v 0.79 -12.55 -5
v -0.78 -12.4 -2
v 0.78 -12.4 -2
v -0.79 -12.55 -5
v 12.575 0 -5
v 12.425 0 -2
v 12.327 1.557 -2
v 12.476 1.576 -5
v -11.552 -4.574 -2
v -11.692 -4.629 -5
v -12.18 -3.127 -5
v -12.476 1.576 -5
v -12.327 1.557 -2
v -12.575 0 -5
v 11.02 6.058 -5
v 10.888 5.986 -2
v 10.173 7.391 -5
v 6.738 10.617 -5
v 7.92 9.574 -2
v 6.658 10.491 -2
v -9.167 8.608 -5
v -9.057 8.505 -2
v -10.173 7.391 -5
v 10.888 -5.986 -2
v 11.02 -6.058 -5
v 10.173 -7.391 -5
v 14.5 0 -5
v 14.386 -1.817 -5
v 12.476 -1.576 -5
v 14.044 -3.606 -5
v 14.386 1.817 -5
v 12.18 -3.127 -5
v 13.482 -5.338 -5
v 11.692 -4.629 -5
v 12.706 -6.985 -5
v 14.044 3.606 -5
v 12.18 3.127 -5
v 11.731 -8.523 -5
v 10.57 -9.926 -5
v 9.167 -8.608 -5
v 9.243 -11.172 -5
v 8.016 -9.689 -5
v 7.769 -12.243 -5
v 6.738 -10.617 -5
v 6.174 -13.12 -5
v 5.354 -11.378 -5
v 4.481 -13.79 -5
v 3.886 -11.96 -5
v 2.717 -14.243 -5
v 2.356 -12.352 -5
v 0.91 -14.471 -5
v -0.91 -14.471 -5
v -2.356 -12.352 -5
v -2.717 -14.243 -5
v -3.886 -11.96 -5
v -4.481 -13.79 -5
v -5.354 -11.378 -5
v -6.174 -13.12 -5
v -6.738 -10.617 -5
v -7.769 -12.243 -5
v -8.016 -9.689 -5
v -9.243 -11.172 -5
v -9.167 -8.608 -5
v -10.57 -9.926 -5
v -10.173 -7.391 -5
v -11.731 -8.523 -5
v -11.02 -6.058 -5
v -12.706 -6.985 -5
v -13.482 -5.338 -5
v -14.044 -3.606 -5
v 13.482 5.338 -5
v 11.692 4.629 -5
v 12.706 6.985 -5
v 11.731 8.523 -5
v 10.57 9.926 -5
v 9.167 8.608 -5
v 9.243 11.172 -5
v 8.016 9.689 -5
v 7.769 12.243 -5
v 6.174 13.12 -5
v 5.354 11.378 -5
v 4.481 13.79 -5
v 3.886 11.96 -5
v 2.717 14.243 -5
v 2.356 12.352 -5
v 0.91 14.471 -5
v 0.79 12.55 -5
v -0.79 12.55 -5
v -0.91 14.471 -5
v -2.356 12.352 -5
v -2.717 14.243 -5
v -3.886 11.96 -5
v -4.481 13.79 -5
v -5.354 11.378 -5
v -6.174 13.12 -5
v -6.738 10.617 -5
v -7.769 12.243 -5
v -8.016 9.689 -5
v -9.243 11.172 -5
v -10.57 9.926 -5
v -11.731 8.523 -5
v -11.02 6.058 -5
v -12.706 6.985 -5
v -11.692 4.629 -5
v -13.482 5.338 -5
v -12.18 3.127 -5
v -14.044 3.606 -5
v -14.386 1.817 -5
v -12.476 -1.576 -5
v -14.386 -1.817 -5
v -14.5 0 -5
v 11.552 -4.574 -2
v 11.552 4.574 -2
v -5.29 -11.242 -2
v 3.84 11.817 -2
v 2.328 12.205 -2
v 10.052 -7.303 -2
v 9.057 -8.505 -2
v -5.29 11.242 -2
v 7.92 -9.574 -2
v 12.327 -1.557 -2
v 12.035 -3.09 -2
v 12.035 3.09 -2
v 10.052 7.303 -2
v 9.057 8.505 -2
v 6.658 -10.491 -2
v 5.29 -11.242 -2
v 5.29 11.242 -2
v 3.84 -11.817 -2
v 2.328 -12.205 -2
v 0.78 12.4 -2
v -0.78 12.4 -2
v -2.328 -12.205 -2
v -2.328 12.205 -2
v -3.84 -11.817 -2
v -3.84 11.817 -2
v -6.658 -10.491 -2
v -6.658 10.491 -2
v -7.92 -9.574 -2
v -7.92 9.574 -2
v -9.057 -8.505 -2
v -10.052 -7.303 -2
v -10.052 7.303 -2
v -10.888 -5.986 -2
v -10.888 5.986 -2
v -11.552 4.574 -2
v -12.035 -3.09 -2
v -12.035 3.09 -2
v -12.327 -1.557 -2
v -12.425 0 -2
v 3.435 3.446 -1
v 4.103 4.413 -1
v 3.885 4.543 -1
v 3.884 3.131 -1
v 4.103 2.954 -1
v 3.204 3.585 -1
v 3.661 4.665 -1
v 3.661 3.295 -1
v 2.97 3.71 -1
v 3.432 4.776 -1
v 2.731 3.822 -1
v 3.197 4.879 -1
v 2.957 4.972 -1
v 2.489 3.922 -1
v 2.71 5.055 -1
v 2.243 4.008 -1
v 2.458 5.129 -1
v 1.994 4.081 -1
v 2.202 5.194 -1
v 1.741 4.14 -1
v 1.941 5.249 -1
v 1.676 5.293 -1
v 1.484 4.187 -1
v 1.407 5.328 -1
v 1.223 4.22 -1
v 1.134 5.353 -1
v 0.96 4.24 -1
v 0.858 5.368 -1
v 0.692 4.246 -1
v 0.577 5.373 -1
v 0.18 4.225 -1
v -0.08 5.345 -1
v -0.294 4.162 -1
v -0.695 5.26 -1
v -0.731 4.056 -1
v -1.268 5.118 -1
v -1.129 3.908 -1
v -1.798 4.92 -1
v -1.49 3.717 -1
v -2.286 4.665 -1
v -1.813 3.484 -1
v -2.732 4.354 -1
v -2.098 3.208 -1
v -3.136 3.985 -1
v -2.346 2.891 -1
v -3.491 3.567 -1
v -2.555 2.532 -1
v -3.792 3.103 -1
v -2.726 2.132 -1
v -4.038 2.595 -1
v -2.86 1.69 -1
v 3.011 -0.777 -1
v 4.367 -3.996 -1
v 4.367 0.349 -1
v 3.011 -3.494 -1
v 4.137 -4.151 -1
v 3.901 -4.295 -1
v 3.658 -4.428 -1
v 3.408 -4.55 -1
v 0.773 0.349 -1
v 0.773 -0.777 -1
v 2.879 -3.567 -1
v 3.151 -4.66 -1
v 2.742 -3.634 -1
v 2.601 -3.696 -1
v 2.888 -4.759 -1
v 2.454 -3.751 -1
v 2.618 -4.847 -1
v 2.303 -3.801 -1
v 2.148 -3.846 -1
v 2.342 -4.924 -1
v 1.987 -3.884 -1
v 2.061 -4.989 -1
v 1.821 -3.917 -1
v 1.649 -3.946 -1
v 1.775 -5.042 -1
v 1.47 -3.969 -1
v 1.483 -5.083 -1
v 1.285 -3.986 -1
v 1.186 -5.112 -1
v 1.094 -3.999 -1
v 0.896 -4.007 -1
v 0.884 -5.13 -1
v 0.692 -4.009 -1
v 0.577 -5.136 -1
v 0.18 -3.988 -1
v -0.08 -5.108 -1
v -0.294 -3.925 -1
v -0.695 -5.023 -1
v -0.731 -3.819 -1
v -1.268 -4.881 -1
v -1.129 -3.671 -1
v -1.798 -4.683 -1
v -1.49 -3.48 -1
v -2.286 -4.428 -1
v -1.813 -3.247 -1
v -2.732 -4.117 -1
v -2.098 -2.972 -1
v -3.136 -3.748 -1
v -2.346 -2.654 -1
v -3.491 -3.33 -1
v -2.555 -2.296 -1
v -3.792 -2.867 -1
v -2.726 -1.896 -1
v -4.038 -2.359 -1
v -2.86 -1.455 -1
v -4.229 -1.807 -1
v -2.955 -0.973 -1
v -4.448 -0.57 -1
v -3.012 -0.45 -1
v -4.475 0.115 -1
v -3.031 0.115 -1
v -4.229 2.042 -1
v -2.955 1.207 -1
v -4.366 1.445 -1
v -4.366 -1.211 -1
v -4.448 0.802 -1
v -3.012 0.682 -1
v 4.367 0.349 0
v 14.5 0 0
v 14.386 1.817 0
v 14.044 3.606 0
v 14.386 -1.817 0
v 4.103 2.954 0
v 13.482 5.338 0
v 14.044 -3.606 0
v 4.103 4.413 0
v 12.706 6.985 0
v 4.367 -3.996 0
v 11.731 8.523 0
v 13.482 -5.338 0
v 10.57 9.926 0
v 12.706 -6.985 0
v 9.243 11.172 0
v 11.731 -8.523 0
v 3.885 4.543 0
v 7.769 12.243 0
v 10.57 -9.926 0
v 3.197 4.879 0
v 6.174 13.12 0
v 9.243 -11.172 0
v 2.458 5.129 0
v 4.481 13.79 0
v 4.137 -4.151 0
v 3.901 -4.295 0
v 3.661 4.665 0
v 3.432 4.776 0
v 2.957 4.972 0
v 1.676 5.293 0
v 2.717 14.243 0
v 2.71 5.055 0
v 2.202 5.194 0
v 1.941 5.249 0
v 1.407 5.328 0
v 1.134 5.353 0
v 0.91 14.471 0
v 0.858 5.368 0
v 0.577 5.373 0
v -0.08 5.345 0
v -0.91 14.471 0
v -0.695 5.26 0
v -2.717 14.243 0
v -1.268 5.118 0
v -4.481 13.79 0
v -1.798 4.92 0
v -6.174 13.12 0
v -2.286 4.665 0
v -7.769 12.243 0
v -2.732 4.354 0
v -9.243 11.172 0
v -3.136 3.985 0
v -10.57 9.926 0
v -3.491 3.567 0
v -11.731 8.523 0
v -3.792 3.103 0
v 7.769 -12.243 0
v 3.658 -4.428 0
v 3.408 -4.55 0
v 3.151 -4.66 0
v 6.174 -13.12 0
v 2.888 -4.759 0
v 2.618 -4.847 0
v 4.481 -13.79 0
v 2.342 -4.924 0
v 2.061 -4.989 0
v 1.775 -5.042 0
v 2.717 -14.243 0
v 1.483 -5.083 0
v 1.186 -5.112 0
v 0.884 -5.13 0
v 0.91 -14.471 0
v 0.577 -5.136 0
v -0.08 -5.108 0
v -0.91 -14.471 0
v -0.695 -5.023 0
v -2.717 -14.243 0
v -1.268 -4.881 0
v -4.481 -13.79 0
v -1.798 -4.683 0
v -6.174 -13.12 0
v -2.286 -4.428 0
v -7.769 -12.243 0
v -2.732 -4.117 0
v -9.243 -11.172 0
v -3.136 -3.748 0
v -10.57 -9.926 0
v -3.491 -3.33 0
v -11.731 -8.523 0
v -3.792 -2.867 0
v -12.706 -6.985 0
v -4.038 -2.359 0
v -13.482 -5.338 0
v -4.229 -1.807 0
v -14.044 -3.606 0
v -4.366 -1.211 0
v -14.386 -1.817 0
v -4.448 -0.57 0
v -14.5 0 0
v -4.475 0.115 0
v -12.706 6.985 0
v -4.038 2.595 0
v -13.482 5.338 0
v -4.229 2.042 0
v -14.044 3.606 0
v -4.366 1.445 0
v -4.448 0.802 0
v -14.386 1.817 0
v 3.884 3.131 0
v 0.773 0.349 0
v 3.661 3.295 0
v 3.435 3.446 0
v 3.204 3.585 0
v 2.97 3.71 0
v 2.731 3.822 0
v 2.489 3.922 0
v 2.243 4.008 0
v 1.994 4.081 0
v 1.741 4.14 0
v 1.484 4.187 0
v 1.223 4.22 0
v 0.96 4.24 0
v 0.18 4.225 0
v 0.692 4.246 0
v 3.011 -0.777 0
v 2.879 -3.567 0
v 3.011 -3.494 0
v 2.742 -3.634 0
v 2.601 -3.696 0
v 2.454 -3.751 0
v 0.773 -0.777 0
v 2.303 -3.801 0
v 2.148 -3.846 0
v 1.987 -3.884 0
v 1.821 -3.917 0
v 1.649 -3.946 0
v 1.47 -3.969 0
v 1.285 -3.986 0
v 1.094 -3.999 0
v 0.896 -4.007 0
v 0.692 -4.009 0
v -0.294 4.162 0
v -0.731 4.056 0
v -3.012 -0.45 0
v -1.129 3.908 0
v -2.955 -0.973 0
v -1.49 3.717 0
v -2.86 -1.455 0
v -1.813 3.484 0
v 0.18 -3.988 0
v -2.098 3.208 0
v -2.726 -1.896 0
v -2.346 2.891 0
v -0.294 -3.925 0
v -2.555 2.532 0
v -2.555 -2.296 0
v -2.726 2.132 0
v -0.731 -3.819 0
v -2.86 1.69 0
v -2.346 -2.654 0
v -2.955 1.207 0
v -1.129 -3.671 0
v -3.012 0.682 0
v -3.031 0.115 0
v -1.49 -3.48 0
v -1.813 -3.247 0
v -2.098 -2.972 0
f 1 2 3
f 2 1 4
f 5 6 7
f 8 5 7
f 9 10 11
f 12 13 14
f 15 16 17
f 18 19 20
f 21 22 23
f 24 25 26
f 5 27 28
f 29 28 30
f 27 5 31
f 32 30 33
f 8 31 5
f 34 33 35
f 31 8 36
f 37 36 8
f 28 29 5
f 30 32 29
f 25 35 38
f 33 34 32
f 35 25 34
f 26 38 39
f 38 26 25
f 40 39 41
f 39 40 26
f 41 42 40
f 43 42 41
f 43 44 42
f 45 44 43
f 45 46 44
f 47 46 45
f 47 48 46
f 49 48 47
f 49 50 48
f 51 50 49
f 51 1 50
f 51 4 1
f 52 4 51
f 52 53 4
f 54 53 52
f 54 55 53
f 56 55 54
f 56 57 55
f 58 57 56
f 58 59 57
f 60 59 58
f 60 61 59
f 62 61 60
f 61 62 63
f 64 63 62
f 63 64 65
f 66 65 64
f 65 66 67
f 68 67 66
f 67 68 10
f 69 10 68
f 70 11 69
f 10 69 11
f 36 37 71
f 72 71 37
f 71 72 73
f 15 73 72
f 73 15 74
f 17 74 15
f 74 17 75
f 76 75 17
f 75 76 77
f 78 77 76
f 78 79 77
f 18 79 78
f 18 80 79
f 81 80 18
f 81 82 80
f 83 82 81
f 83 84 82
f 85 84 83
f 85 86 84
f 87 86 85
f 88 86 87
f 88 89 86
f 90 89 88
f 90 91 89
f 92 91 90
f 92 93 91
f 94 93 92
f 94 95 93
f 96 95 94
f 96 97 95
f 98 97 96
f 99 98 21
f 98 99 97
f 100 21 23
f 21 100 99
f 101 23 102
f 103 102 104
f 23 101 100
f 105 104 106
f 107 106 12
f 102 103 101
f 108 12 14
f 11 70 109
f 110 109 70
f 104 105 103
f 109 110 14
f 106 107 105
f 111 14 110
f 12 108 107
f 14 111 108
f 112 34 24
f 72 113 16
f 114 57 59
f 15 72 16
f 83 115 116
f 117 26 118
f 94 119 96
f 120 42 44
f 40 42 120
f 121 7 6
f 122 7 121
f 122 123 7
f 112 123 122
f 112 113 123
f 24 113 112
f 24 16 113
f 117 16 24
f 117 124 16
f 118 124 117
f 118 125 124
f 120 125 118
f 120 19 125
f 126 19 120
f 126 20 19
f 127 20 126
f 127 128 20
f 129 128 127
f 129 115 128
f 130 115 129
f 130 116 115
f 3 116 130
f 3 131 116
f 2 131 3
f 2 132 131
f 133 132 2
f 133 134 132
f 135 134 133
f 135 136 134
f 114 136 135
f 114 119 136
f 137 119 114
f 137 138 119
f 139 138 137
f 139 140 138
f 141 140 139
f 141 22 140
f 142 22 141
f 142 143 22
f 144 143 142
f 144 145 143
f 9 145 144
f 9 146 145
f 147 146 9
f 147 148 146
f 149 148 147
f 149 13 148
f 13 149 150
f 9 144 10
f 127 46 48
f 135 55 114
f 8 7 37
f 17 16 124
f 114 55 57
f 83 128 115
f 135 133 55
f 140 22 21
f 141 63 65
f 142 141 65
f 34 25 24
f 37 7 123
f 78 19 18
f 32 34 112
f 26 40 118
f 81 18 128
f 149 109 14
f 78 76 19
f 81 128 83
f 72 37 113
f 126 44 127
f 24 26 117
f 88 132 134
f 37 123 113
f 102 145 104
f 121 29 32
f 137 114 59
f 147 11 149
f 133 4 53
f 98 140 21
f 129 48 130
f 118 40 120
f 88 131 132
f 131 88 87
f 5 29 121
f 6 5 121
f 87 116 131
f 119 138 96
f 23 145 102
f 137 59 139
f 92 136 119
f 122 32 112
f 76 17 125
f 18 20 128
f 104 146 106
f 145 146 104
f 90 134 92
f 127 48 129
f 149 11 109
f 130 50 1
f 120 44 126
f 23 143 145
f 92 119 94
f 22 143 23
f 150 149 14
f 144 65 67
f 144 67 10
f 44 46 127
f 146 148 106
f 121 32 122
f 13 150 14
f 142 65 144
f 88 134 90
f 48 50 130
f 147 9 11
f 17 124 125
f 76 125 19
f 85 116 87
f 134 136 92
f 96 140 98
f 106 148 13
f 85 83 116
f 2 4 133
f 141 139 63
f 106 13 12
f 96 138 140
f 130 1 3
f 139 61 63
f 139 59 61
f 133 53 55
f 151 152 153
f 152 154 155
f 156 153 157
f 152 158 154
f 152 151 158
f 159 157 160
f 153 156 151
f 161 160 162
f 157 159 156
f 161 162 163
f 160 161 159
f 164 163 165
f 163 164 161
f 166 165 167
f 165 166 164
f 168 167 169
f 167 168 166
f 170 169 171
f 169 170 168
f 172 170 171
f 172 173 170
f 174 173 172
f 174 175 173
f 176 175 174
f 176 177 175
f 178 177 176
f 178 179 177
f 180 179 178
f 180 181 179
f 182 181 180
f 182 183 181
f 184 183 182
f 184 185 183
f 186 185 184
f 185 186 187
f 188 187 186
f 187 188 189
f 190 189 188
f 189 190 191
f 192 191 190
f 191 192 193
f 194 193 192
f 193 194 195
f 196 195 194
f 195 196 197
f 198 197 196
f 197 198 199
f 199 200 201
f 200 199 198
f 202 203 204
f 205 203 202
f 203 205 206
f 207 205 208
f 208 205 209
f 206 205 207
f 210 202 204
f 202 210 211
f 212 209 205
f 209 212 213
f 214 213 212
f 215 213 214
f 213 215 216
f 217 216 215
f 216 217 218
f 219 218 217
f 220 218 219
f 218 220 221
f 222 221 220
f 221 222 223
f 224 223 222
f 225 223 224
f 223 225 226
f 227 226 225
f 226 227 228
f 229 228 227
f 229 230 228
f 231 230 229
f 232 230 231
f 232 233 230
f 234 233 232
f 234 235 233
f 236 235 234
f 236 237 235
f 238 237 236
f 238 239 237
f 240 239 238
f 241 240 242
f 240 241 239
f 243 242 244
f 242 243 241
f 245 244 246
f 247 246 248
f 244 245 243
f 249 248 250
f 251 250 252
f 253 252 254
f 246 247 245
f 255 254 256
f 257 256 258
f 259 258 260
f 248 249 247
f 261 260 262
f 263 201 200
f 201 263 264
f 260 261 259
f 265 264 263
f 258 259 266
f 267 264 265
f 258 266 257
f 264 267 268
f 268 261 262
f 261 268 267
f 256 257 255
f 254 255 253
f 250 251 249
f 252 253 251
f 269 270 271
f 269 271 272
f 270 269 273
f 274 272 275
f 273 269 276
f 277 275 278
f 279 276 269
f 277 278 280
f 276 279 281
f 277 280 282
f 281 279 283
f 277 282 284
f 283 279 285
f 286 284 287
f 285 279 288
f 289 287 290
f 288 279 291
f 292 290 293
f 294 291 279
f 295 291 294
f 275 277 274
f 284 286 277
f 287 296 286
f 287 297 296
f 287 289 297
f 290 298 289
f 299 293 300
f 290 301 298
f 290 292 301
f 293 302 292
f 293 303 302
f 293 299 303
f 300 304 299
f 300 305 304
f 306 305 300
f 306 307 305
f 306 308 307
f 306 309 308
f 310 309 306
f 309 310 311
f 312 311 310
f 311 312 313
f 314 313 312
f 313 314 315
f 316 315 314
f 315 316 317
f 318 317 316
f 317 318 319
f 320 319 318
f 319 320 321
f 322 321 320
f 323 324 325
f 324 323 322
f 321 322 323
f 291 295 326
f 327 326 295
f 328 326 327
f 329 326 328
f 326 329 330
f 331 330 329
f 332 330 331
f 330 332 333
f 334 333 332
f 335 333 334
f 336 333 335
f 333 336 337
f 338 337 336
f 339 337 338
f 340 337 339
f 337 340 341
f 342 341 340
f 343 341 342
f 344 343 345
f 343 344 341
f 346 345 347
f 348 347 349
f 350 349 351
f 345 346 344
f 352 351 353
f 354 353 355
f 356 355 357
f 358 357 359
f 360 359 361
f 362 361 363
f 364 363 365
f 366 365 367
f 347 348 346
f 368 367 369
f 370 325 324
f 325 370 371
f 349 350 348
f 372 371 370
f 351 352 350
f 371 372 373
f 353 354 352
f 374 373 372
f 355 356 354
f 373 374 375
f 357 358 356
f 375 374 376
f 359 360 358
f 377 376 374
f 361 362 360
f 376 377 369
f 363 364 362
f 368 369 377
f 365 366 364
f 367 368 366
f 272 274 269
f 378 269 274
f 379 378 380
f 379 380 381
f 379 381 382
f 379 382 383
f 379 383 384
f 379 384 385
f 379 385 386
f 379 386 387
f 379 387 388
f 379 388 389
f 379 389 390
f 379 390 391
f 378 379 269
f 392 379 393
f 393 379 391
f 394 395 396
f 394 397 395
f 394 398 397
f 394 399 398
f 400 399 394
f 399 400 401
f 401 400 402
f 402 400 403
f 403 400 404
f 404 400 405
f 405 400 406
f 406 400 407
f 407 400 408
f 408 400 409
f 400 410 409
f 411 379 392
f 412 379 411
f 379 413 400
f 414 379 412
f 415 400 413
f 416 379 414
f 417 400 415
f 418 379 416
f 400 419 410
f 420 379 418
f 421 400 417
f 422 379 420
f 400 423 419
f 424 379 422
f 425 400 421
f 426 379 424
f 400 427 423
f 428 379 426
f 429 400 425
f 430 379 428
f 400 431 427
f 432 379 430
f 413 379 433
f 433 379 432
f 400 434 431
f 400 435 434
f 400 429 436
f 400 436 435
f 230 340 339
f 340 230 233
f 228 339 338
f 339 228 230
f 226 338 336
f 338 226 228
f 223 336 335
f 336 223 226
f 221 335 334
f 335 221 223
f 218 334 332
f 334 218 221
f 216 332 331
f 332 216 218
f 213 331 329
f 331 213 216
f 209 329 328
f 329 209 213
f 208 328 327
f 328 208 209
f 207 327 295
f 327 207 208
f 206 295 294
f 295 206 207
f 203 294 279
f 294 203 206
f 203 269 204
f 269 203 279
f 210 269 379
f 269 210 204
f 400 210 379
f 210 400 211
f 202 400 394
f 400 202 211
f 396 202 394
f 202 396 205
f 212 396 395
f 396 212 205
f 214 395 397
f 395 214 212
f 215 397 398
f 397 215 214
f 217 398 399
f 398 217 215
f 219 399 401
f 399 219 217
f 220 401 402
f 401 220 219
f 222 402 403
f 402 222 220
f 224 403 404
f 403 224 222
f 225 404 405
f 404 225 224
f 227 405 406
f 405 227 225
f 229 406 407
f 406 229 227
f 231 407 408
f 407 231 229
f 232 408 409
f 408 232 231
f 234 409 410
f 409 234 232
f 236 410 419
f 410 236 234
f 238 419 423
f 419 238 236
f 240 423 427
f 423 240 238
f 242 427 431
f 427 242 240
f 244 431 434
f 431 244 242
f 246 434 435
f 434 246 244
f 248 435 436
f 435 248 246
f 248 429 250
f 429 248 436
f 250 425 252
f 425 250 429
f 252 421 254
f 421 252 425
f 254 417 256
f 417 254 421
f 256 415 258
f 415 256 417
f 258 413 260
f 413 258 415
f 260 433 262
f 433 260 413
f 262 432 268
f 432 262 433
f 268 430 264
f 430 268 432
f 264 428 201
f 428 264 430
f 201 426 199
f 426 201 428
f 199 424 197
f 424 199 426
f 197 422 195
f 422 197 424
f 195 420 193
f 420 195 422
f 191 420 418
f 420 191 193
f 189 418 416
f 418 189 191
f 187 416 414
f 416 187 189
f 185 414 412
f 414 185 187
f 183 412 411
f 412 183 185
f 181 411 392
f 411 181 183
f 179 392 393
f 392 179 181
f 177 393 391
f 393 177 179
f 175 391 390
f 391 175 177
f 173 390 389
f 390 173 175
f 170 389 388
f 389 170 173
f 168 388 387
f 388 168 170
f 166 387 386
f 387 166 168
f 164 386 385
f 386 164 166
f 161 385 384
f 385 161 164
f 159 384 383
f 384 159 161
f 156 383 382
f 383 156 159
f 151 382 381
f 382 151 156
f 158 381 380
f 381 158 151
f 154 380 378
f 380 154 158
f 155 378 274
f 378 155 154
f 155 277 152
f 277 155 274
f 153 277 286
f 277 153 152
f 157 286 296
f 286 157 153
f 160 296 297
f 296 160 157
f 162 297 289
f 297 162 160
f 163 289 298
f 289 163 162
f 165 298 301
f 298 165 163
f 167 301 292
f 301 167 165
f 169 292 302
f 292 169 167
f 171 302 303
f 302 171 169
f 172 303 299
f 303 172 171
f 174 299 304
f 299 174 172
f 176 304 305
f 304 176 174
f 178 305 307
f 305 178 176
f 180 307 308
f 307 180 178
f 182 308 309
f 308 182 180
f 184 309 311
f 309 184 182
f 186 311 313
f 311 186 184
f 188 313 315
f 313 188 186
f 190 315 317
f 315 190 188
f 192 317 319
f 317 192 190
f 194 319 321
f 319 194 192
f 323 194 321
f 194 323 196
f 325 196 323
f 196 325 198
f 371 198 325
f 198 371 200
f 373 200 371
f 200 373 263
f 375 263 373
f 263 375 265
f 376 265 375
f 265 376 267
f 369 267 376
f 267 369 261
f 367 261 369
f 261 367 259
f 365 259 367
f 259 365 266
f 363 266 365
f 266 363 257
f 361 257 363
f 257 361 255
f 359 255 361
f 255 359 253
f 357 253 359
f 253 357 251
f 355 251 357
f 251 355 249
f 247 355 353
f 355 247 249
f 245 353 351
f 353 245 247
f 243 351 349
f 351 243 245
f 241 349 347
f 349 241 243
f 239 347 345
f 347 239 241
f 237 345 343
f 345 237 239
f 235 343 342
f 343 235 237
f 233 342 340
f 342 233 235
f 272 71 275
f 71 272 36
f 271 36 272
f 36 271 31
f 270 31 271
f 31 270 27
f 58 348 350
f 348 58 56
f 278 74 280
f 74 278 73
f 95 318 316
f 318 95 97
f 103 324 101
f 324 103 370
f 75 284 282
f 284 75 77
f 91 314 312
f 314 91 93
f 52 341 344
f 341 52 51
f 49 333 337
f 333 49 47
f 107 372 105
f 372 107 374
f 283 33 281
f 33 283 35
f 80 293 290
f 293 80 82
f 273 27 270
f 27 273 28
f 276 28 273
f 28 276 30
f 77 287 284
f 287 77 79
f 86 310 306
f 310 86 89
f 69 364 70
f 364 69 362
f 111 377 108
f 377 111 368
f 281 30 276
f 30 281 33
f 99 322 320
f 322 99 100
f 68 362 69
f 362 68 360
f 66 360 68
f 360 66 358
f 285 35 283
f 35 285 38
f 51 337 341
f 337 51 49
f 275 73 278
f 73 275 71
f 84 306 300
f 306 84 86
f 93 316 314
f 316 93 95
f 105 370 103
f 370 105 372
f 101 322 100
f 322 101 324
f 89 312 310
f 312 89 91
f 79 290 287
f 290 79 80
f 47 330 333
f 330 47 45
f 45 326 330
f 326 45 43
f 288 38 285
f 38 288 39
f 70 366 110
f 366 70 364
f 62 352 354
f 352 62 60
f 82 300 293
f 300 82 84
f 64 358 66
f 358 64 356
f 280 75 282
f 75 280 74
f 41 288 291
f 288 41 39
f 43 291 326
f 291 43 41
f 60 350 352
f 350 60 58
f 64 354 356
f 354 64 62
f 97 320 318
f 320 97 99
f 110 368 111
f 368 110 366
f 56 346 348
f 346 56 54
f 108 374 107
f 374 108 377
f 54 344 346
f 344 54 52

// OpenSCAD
$fn = 50;

difference() {
	union() {
		translate(v = [0, 0, -5.0]) {
			cylinder(h = 5, r = 14.5);
		}
	}
	union() {
		#translate(v = [0, 0, -5.0]) {
			cylinder(h = 3, r1 = 12.575, r2 = 12.425);
		}
		translate(v = [0, 0, -1]) {
			linear_extrude(height = 1) {
				text(font = "Impact", halign = "center", size = 10, text = "G", valign = "center");
			}
		}
	}
}
